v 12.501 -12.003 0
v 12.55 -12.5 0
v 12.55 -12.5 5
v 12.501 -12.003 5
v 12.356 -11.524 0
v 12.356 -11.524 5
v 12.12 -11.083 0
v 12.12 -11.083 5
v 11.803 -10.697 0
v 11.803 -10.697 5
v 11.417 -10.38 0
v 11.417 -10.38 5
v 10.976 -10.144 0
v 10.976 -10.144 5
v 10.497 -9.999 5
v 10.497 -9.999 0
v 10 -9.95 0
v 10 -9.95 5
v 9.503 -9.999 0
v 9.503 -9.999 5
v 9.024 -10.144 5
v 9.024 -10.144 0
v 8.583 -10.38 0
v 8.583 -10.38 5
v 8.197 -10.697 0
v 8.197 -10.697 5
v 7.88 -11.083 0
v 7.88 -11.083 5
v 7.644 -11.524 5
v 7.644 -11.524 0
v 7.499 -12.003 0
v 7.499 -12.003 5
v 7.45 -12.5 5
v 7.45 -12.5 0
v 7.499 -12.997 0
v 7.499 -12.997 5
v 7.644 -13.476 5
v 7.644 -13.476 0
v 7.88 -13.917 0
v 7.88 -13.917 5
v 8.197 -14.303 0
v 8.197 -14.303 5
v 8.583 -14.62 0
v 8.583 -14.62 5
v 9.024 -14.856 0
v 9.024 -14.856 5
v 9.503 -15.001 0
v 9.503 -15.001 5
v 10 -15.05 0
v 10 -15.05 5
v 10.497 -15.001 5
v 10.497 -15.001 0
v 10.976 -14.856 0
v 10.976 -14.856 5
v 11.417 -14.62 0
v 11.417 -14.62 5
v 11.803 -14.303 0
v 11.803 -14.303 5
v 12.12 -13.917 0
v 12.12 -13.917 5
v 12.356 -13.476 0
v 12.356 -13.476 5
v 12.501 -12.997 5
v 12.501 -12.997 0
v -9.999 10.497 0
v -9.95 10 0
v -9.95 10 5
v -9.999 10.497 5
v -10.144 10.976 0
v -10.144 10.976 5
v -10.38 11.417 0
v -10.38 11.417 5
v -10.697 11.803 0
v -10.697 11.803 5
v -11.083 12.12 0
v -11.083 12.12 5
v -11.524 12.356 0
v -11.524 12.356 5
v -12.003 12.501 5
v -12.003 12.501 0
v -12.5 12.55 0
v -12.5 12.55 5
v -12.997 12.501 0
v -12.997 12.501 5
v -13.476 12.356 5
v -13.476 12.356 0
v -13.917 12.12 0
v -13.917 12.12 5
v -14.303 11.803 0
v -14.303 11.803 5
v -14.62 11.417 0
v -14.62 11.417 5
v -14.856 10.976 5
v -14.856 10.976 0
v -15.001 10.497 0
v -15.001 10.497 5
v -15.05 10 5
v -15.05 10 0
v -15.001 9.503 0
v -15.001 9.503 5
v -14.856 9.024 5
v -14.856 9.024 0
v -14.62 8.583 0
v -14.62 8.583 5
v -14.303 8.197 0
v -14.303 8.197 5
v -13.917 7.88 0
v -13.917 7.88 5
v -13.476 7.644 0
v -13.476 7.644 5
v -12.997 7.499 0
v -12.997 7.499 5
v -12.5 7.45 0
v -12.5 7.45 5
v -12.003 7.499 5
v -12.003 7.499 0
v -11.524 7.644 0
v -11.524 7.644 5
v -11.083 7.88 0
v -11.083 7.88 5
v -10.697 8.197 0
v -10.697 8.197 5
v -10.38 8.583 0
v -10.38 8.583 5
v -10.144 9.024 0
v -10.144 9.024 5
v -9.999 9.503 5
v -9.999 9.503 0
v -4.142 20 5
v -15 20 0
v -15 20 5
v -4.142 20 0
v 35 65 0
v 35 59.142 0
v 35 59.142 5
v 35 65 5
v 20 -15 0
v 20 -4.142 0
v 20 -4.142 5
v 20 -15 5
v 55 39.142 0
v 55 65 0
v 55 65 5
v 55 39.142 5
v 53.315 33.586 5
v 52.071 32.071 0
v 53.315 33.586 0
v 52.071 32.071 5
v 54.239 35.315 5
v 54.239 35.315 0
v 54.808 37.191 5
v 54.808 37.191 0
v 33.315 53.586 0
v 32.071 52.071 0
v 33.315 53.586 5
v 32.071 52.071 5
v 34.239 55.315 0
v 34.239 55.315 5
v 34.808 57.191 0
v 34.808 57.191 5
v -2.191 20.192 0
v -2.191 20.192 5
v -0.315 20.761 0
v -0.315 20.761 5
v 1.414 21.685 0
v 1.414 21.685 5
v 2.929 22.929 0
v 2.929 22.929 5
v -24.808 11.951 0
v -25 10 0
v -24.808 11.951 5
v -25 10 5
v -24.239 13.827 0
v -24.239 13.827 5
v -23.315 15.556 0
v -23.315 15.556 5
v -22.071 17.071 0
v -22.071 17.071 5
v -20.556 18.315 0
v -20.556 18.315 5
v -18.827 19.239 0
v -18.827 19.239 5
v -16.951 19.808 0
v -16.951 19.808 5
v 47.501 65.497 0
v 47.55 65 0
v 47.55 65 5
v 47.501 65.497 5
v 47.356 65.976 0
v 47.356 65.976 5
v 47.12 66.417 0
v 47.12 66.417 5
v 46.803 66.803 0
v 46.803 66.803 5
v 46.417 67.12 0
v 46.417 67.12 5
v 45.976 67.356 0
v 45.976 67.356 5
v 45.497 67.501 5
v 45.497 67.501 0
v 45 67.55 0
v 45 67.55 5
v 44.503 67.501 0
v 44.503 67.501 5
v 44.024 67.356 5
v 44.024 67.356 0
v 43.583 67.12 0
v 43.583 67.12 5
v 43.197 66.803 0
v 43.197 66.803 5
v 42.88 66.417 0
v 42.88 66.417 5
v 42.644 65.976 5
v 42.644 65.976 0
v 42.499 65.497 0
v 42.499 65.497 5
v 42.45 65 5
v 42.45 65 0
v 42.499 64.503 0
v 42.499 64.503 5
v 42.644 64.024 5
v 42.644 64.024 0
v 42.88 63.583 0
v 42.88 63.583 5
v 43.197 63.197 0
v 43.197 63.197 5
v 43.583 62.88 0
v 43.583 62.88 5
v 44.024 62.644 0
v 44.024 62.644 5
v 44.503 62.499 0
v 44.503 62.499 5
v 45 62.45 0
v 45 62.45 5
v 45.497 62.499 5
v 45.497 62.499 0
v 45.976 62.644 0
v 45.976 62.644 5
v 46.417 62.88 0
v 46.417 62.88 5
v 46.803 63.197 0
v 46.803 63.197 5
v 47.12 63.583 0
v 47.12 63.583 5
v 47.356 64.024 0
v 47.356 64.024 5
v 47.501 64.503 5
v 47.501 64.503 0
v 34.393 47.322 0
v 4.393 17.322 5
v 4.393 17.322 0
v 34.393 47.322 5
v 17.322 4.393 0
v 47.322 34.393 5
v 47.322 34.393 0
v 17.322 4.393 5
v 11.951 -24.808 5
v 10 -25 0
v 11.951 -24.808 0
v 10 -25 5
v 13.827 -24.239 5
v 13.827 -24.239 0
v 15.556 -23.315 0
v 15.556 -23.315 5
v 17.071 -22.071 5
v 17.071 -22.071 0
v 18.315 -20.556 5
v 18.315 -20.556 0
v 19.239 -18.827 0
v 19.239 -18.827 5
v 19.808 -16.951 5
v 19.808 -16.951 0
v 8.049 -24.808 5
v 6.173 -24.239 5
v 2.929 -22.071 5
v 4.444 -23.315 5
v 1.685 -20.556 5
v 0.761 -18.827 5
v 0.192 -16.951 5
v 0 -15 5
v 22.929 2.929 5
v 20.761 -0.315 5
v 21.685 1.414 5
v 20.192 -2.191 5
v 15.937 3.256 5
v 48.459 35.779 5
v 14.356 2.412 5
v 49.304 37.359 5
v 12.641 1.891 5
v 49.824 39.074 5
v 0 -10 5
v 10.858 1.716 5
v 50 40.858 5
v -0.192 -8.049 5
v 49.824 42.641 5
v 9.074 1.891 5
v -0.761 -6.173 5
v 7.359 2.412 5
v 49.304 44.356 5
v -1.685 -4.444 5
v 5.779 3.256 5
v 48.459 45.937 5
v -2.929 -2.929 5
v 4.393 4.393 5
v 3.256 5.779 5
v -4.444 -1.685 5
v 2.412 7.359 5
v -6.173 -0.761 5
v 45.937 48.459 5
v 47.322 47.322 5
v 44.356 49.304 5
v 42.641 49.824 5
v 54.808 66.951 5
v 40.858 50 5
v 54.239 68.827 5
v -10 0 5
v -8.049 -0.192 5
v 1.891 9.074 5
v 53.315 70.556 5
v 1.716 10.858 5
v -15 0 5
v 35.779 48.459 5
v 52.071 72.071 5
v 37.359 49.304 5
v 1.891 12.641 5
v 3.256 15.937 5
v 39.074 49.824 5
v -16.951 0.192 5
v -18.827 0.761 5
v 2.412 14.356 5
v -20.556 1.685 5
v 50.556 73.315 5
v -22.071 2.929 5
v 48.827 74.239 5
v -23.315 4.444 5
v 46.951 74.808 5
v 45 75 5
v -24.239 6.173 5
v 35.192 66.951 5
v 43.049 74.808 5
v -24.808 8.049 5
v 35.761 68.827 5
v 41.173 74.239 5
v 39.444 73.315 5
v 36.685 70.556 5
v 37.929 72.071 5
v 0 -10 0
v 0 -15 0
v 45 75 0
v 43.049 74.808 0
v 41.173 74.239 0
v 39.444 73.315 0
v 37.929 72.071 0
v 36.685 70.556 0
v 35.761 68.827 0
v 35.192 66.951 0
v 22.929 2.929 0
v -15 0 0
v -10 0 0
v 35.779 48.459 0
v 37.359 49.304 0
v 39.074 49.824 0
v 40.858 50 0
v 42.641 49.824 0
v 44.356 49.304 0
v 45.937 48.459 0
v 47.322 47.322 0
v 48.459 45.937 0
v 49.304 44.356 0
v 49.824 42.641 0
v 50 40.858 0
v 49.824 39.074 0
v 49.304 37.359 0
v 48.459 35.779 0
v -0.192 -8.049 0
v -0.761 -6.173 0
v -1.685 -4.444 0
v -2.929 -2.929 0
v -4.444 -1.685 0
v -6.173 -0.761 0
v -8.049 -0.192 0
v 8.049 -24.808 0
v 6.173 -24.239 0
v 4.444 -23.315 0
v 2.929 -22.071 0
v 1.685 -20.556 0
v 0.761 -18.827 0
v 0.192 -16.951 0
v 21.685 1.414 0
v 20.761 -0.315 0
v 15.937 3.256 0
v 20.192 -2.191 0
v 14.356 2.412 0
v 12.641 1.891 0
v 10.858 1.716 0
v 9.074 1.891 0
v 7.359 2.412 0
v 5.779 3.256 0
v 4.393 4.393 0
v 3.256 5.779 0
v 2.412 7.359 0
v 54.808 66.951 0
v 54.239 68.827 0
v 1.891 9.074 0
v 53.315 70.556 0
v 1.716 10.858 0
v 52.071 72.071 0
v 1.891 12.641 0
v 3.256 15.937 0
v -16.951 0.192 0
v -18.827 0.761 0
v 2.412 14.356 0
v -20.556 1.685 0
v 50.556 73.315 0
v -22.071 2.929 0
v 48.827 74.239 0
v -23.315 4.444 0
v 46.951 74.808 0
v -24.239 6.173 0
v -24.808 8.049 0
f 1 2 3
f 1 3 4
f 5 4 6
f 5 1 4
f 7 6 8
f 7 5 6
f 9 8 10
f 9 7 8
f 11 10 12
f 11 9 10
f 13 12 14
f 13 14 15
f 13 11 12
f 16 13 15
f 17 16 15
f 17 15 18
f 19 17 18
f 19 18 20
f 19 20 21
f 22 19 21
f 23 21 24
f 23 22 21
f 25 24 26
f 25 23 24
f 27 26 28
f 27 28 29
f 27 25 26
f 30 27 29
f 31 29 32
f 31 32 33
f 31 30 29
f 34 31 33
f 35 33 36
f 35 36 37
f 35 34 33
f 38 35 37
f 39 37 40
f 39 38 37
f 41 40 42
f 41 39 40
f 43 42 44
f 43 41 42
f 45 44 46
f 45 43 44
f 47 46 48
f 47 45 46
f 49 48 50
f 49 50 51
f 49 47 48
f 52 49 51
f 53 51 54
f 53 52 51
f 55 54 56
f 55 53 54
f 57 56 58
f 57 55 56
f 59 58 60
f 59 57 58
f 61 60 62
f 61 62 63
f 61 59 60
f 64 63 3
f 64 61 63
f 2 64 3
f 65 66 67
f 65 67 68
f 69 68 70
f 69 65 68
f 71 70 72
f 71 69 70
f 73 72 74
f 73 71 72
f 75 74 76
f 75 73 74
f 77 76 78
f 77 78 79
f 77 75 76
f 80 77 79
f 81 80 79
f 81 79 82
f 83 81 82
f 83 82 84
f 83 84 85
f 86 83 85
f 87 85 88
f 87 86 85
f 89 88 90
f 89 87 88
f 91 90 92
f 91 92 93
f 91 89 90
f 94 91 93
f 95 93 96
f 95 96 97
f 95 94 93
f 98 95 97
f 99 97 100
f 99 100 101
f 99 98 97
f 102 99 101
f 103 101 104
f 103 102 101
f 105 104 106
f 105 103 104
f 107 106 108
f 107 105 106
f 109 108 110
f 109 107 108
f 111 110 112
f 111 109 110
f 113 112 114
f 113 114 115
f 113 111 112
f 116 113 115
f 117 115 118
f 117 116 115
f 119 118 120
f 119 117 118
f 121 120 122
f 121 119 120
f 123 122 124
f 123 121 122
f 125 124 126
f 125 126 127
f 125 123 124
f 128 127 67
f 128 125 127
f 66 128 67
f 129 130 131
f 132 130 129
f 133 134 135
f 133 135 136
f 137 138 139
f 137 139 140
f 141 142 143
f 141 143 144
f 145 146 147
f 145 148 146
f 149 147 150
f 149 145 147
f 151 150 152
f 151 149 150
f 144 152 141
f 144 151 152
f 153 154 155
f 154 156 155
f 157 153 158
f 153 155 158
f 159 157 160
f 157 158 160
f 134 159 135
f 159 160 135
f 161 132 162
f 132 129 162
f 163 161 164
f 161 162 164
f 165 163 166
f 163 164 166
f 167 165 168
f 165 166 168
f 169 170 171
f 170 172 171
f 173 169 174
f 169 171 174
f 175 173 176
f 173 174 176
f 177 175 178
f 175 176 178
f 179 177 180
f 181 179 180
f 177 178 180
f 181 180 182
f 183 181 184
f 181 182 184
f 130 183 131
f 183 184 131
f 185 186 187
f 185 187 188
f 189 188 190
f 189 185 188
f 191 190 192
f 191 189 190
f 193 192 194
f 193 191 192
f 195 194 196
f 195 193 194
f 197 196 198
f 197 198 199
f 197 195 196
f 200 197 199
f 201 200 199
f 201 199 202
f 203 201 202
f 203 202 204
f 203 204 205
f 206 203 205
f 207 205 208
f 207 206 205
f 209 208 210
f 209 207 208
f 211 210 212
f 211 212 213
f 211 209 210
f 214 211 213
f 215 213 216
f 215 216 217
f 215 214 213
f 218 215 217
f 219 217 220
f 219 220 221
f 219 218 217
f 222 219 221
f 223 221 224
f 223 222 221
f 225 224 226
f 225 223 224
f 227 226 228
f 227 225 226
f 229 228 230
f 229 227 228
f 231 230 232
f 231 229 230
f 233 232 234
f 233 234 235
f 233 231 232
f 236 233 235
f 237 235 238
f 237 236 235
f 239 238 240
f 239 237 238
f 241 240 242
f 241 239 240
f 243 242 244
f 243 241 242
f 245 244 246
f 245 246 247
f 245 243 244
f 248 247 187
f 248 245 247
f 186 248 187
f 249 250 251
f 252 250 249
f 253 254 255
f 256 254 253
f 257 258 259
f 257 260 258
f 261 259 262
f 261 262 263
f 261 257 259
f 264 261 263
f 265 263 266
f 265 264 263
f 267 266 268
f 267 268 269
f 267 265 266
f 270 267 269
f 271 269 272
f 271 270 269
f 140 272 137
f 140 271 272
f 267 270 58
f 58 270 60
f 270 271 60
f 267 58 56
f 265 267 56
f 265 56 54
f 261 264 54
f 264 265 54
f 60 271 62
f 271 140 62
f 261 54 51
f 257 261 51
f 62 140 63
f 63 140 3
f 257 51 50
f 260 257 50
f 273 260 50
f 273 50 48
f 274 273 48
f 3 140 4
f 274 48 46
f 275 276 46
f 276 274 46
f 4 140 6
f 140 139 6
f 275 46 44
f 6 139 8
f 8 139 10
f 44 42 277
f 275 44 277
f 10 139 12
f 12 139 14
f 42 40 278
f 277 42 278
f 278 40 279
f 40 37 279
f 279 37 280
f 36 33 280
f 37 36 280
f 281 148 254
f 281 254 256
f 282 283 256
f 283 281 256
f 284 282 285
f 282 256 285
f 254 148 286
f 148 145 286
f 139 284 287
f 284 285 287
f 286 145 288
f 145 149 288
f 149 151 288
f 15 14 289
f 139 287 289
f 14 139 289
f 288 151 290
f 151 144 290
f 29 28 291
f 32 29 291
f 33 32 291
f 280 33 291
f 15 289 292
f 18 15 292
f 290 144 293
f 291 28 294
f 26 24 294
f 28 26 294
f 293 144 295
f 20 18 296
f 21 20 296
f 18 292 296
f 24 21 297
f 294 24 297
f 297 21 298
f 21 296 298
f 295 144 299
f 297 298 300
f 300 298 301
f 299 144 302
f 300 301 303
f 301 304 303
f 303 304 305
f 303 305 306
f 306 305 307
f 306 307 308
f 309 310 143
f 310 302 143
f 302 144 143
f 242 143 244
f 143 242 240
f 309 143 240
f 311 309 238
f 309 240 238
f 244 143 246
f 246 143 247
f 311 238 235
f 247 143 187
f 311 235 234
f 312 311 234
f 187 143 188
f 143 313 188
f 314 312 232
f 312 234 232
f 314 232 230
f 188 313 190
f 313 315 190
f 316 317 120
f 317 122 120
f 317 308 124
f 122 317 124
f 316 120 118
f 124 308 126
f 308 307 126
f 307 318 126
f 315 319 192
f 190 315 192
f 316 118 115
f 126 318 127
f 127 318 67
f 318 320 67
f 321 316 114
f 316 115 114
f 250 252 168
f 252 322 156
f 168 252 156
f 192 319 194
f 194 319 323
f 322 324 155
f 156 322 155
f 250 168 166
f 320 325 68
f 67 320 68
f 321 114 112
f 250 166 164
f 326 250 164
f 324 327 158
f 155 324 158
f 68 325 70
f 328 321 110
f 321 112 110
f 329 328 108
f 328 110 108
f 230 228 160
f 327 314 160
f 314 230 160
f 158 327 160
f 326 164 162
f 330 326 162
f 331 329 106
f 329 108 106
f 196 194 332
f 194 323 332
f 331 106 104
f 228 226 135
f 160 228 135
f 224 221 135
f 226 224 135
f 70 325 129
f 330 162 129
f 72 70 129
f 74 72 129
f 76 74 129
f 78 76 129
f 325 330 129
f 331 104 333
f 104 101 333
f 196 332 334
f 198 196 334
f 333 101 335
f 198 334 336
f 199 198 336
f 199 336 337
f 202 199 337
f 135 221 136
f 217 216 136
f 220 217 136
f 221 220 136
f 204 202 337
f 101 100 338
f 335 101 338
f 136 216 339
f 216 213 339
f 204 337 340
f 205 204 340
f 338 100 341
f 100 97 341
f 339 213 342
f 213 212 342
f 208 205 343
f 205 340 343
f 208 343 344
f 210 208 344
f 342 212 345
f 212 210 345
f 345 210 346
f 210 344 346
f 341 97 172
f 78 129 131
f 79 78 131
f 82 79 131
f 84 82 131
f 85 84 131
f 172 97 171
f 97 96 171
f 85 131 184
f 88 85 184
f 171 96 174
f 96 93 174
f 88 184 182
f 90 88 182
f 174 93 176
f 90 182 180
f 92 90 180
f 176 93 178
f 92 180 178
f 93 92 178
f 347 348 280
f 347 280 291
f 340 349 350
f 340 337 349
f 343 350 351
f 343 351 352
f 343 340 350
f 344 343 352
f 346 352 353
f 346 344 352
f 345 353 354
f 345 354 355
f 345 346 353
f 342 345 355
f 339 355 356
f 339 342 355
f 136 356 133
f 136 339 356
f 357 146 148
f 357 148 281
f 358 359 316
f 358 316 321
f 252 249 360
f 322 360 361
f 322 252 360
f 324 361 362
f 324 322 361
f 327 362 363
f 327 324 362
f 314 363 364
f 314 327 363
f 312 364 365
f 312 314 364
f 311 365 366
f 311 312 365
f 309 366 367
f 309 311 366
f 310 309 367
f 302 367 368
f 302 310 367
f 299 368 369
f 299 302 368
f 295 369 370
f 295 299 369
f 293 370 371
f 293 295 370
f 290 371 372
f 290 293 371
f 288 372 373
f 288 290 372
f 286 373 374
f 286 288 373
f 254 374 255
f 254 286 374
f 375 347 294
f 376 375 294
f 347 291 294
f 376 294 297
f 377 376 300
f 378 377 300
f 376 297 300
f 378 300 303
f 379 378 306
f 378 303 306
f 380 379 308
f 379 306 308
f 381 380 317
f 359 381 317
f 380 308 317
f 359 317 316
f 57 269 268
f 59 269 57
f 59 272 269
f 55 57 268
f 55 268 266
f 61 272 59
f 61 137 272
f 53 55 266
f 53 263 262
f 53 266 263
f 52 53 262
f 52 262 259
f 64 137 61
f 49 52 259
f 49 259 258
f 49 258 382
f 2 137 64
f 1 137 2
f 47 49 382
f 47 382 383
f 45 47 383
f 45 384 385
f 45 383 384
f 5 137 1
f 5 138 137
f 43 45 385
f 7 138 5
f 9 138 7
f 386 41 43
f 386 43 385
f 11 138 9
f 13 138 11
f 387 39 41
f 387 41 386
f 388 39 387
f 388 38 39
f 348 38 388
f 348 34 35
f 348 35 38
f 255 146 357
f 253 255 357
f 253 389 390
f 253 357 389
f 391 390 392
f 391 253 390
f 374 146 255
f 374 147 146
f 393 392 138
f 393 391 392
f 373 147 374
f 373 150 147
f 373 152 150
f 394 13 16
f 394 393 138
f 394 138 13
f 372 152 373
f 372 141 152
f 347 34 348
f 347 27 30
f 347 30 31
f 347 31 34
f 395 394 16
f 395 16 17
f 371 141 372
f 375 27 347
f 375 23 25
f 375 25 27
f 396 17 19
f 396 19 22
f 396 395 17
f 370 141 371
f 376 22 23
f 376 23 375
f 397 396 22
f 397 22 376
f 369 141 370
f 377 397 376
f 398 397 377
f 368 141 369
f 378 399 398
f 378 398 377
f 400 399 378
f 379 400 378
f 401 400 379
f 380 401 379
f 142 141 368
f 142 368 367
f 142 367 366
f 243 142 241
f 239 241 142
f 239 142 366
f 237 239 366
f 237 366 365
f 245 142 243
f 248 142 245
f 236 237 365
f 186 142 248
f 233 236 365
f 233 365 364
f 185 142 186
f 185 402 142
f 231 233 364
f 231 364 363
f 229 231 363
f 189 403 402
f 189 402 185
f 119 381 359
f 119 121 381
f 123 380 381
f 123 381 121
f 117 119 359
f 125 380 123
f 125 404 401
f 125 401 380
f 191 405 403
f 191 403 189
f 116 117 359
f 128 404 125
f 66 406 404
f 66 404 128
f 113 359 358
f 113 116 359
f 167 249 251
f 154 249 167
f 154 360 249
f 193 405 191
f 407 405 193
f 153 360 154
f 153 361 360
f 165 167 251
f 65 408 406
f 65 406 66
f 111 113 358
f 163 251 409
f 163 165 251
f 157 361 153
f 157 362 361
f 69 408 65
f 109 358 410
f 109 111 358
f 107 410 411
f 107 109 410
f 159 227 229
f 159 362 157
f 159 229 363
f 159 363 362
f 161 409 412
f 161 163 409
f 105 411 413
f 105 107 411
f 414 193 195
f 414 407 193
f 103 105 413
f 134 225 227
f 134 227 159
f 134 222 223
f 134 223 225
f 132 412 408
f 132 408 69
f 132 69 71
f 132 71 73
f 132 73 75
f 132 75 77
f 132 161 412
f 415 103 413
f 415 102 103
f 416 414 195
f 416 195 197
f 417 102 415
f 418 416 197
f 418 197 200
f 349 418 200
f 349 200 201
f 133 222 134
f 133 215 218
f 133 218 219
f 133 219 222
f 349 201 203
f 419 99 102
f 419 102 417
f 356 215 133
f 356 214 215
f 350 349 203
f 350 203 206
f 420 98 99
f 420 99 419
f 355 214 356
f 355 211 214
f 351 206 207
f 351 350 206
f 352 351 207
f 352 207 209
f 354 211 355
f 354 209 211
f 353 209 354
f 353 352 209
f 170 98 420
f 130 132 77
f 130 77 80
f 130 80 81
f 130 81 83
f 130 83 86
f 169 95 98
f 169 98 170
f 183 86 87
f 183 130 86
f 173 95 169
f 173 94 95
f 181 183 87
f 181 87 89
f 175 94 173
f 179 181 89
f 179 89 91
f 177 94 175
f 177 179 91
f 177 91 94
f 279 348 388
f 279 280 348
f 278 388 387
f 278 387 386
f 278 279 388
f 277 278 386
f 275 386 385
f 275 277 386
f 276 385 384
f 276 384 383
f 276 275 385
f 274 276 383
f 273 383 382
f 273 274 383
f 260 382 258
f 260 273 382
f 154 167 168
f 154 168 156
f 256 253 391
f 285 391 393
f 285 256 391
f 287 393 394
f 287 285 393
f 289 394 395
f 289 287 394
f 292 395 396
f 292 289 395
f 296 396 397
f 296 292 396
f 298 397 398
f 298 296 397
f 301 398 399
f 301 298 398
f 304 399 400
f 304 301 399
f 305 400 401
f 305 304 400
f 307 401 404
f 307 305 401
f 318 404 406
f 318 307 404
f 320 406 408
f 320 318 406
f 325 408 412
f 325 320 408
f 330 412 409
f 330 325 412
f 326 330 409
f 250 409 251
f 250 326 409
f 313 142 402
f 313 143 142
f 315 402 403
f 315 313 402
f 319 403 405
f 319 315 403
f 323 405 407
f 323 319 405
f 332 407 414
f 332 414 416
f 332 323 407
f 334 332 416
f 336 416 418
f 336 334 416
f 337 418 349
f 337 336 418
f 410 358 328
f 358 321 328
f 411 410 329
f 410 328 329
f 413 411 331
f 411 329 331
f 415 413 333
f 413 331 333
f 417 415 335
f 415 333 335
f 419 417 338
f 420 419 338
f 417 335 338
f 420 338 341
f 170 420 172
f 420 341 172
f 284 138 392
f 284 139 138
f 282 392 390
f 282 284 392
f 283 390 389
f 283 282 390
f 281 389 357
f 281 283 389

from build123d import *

# Parameters (mm, degrees)
SKETCH_1_R          = 2.55
EXTRUDE_1_DEPTH     = 5
FILLET_1_R          = 10
CUT_EXTRUDE_1_DEPTH = 94.139680051


with BuildPart() as part:
    # ｽｹｯﾁ1 → ﾎﾞｽ - 押し出し1 (new body)
    with BuildSketch(Plane.XY):
        Polygon((0, -25), (0, 0), (-25, 0), (-25, 20), (0, 20), (35, 55), (35, 75), (55, 75), (55, 35), (20, 0), (20, -25), align=None)
        with Locations((-12.5, 10)):
            Circle(SKETCH_1_R, mode=Mode.SUBTRACT)
        with Locations((10, -12.5)):
            Circle(SKETCH_1_R, mode=Mode.SUBTRACT)
        with Locations((45, 65)):
            Circle(SKETCH_1_R, mode=Mode.SUBTRACT)
    extrude(amount=EXTRUDE_1_DEPTH)

    # ﾌｨﾚｯﾄ1
    fillet_1_edges = [part.edges().sort_by_distance(p)[0] for p in [
        (35, 75, 2.5),
        (55, 75, 2.5),
        (20, 0, 2.5),
        (20, -25, 2.5),
        (0, -25, 2.5),
        (0, 0, 2.5),
        (-25, 0, 2.5),
        (-25, 20, 2.5),
        (0, 20, 2.5),
        (35, 55, 2.5),
        (55, 35, 2.5),
    ]]
    fillet(fillet_1_edges, radius=FILLET_1_R - 0.0001)  # a hair under: the kernel refuses the full size

    # ｽｹｯﾁ2 → ｶｯﾄ - 押し出し1 (cut, through all)
    with BuildSketch(Plane.XY.offset(5)):
        with BuildLine():
            Line((4.393398282, 17.32233047), (34.393398282, 47.32233047))
            ThreePointArc((34.393398282, 47.32233047), (47.32233047, 47.32233047), (47.32233047, 34.393398282))
            Line((47.32233047, 34.393398282), (17.32233047, 4.393398282))
            ThreePointArc((17.32233047, 4.393398282), (4.393398282, 4.393398282), (4.393398282, 17.32233047))
        make_face()
    extrude(amount=-CUT_EXTRUDE_1_DEPTH, mode=Mode.SUBTRACT)


solid = part.part
